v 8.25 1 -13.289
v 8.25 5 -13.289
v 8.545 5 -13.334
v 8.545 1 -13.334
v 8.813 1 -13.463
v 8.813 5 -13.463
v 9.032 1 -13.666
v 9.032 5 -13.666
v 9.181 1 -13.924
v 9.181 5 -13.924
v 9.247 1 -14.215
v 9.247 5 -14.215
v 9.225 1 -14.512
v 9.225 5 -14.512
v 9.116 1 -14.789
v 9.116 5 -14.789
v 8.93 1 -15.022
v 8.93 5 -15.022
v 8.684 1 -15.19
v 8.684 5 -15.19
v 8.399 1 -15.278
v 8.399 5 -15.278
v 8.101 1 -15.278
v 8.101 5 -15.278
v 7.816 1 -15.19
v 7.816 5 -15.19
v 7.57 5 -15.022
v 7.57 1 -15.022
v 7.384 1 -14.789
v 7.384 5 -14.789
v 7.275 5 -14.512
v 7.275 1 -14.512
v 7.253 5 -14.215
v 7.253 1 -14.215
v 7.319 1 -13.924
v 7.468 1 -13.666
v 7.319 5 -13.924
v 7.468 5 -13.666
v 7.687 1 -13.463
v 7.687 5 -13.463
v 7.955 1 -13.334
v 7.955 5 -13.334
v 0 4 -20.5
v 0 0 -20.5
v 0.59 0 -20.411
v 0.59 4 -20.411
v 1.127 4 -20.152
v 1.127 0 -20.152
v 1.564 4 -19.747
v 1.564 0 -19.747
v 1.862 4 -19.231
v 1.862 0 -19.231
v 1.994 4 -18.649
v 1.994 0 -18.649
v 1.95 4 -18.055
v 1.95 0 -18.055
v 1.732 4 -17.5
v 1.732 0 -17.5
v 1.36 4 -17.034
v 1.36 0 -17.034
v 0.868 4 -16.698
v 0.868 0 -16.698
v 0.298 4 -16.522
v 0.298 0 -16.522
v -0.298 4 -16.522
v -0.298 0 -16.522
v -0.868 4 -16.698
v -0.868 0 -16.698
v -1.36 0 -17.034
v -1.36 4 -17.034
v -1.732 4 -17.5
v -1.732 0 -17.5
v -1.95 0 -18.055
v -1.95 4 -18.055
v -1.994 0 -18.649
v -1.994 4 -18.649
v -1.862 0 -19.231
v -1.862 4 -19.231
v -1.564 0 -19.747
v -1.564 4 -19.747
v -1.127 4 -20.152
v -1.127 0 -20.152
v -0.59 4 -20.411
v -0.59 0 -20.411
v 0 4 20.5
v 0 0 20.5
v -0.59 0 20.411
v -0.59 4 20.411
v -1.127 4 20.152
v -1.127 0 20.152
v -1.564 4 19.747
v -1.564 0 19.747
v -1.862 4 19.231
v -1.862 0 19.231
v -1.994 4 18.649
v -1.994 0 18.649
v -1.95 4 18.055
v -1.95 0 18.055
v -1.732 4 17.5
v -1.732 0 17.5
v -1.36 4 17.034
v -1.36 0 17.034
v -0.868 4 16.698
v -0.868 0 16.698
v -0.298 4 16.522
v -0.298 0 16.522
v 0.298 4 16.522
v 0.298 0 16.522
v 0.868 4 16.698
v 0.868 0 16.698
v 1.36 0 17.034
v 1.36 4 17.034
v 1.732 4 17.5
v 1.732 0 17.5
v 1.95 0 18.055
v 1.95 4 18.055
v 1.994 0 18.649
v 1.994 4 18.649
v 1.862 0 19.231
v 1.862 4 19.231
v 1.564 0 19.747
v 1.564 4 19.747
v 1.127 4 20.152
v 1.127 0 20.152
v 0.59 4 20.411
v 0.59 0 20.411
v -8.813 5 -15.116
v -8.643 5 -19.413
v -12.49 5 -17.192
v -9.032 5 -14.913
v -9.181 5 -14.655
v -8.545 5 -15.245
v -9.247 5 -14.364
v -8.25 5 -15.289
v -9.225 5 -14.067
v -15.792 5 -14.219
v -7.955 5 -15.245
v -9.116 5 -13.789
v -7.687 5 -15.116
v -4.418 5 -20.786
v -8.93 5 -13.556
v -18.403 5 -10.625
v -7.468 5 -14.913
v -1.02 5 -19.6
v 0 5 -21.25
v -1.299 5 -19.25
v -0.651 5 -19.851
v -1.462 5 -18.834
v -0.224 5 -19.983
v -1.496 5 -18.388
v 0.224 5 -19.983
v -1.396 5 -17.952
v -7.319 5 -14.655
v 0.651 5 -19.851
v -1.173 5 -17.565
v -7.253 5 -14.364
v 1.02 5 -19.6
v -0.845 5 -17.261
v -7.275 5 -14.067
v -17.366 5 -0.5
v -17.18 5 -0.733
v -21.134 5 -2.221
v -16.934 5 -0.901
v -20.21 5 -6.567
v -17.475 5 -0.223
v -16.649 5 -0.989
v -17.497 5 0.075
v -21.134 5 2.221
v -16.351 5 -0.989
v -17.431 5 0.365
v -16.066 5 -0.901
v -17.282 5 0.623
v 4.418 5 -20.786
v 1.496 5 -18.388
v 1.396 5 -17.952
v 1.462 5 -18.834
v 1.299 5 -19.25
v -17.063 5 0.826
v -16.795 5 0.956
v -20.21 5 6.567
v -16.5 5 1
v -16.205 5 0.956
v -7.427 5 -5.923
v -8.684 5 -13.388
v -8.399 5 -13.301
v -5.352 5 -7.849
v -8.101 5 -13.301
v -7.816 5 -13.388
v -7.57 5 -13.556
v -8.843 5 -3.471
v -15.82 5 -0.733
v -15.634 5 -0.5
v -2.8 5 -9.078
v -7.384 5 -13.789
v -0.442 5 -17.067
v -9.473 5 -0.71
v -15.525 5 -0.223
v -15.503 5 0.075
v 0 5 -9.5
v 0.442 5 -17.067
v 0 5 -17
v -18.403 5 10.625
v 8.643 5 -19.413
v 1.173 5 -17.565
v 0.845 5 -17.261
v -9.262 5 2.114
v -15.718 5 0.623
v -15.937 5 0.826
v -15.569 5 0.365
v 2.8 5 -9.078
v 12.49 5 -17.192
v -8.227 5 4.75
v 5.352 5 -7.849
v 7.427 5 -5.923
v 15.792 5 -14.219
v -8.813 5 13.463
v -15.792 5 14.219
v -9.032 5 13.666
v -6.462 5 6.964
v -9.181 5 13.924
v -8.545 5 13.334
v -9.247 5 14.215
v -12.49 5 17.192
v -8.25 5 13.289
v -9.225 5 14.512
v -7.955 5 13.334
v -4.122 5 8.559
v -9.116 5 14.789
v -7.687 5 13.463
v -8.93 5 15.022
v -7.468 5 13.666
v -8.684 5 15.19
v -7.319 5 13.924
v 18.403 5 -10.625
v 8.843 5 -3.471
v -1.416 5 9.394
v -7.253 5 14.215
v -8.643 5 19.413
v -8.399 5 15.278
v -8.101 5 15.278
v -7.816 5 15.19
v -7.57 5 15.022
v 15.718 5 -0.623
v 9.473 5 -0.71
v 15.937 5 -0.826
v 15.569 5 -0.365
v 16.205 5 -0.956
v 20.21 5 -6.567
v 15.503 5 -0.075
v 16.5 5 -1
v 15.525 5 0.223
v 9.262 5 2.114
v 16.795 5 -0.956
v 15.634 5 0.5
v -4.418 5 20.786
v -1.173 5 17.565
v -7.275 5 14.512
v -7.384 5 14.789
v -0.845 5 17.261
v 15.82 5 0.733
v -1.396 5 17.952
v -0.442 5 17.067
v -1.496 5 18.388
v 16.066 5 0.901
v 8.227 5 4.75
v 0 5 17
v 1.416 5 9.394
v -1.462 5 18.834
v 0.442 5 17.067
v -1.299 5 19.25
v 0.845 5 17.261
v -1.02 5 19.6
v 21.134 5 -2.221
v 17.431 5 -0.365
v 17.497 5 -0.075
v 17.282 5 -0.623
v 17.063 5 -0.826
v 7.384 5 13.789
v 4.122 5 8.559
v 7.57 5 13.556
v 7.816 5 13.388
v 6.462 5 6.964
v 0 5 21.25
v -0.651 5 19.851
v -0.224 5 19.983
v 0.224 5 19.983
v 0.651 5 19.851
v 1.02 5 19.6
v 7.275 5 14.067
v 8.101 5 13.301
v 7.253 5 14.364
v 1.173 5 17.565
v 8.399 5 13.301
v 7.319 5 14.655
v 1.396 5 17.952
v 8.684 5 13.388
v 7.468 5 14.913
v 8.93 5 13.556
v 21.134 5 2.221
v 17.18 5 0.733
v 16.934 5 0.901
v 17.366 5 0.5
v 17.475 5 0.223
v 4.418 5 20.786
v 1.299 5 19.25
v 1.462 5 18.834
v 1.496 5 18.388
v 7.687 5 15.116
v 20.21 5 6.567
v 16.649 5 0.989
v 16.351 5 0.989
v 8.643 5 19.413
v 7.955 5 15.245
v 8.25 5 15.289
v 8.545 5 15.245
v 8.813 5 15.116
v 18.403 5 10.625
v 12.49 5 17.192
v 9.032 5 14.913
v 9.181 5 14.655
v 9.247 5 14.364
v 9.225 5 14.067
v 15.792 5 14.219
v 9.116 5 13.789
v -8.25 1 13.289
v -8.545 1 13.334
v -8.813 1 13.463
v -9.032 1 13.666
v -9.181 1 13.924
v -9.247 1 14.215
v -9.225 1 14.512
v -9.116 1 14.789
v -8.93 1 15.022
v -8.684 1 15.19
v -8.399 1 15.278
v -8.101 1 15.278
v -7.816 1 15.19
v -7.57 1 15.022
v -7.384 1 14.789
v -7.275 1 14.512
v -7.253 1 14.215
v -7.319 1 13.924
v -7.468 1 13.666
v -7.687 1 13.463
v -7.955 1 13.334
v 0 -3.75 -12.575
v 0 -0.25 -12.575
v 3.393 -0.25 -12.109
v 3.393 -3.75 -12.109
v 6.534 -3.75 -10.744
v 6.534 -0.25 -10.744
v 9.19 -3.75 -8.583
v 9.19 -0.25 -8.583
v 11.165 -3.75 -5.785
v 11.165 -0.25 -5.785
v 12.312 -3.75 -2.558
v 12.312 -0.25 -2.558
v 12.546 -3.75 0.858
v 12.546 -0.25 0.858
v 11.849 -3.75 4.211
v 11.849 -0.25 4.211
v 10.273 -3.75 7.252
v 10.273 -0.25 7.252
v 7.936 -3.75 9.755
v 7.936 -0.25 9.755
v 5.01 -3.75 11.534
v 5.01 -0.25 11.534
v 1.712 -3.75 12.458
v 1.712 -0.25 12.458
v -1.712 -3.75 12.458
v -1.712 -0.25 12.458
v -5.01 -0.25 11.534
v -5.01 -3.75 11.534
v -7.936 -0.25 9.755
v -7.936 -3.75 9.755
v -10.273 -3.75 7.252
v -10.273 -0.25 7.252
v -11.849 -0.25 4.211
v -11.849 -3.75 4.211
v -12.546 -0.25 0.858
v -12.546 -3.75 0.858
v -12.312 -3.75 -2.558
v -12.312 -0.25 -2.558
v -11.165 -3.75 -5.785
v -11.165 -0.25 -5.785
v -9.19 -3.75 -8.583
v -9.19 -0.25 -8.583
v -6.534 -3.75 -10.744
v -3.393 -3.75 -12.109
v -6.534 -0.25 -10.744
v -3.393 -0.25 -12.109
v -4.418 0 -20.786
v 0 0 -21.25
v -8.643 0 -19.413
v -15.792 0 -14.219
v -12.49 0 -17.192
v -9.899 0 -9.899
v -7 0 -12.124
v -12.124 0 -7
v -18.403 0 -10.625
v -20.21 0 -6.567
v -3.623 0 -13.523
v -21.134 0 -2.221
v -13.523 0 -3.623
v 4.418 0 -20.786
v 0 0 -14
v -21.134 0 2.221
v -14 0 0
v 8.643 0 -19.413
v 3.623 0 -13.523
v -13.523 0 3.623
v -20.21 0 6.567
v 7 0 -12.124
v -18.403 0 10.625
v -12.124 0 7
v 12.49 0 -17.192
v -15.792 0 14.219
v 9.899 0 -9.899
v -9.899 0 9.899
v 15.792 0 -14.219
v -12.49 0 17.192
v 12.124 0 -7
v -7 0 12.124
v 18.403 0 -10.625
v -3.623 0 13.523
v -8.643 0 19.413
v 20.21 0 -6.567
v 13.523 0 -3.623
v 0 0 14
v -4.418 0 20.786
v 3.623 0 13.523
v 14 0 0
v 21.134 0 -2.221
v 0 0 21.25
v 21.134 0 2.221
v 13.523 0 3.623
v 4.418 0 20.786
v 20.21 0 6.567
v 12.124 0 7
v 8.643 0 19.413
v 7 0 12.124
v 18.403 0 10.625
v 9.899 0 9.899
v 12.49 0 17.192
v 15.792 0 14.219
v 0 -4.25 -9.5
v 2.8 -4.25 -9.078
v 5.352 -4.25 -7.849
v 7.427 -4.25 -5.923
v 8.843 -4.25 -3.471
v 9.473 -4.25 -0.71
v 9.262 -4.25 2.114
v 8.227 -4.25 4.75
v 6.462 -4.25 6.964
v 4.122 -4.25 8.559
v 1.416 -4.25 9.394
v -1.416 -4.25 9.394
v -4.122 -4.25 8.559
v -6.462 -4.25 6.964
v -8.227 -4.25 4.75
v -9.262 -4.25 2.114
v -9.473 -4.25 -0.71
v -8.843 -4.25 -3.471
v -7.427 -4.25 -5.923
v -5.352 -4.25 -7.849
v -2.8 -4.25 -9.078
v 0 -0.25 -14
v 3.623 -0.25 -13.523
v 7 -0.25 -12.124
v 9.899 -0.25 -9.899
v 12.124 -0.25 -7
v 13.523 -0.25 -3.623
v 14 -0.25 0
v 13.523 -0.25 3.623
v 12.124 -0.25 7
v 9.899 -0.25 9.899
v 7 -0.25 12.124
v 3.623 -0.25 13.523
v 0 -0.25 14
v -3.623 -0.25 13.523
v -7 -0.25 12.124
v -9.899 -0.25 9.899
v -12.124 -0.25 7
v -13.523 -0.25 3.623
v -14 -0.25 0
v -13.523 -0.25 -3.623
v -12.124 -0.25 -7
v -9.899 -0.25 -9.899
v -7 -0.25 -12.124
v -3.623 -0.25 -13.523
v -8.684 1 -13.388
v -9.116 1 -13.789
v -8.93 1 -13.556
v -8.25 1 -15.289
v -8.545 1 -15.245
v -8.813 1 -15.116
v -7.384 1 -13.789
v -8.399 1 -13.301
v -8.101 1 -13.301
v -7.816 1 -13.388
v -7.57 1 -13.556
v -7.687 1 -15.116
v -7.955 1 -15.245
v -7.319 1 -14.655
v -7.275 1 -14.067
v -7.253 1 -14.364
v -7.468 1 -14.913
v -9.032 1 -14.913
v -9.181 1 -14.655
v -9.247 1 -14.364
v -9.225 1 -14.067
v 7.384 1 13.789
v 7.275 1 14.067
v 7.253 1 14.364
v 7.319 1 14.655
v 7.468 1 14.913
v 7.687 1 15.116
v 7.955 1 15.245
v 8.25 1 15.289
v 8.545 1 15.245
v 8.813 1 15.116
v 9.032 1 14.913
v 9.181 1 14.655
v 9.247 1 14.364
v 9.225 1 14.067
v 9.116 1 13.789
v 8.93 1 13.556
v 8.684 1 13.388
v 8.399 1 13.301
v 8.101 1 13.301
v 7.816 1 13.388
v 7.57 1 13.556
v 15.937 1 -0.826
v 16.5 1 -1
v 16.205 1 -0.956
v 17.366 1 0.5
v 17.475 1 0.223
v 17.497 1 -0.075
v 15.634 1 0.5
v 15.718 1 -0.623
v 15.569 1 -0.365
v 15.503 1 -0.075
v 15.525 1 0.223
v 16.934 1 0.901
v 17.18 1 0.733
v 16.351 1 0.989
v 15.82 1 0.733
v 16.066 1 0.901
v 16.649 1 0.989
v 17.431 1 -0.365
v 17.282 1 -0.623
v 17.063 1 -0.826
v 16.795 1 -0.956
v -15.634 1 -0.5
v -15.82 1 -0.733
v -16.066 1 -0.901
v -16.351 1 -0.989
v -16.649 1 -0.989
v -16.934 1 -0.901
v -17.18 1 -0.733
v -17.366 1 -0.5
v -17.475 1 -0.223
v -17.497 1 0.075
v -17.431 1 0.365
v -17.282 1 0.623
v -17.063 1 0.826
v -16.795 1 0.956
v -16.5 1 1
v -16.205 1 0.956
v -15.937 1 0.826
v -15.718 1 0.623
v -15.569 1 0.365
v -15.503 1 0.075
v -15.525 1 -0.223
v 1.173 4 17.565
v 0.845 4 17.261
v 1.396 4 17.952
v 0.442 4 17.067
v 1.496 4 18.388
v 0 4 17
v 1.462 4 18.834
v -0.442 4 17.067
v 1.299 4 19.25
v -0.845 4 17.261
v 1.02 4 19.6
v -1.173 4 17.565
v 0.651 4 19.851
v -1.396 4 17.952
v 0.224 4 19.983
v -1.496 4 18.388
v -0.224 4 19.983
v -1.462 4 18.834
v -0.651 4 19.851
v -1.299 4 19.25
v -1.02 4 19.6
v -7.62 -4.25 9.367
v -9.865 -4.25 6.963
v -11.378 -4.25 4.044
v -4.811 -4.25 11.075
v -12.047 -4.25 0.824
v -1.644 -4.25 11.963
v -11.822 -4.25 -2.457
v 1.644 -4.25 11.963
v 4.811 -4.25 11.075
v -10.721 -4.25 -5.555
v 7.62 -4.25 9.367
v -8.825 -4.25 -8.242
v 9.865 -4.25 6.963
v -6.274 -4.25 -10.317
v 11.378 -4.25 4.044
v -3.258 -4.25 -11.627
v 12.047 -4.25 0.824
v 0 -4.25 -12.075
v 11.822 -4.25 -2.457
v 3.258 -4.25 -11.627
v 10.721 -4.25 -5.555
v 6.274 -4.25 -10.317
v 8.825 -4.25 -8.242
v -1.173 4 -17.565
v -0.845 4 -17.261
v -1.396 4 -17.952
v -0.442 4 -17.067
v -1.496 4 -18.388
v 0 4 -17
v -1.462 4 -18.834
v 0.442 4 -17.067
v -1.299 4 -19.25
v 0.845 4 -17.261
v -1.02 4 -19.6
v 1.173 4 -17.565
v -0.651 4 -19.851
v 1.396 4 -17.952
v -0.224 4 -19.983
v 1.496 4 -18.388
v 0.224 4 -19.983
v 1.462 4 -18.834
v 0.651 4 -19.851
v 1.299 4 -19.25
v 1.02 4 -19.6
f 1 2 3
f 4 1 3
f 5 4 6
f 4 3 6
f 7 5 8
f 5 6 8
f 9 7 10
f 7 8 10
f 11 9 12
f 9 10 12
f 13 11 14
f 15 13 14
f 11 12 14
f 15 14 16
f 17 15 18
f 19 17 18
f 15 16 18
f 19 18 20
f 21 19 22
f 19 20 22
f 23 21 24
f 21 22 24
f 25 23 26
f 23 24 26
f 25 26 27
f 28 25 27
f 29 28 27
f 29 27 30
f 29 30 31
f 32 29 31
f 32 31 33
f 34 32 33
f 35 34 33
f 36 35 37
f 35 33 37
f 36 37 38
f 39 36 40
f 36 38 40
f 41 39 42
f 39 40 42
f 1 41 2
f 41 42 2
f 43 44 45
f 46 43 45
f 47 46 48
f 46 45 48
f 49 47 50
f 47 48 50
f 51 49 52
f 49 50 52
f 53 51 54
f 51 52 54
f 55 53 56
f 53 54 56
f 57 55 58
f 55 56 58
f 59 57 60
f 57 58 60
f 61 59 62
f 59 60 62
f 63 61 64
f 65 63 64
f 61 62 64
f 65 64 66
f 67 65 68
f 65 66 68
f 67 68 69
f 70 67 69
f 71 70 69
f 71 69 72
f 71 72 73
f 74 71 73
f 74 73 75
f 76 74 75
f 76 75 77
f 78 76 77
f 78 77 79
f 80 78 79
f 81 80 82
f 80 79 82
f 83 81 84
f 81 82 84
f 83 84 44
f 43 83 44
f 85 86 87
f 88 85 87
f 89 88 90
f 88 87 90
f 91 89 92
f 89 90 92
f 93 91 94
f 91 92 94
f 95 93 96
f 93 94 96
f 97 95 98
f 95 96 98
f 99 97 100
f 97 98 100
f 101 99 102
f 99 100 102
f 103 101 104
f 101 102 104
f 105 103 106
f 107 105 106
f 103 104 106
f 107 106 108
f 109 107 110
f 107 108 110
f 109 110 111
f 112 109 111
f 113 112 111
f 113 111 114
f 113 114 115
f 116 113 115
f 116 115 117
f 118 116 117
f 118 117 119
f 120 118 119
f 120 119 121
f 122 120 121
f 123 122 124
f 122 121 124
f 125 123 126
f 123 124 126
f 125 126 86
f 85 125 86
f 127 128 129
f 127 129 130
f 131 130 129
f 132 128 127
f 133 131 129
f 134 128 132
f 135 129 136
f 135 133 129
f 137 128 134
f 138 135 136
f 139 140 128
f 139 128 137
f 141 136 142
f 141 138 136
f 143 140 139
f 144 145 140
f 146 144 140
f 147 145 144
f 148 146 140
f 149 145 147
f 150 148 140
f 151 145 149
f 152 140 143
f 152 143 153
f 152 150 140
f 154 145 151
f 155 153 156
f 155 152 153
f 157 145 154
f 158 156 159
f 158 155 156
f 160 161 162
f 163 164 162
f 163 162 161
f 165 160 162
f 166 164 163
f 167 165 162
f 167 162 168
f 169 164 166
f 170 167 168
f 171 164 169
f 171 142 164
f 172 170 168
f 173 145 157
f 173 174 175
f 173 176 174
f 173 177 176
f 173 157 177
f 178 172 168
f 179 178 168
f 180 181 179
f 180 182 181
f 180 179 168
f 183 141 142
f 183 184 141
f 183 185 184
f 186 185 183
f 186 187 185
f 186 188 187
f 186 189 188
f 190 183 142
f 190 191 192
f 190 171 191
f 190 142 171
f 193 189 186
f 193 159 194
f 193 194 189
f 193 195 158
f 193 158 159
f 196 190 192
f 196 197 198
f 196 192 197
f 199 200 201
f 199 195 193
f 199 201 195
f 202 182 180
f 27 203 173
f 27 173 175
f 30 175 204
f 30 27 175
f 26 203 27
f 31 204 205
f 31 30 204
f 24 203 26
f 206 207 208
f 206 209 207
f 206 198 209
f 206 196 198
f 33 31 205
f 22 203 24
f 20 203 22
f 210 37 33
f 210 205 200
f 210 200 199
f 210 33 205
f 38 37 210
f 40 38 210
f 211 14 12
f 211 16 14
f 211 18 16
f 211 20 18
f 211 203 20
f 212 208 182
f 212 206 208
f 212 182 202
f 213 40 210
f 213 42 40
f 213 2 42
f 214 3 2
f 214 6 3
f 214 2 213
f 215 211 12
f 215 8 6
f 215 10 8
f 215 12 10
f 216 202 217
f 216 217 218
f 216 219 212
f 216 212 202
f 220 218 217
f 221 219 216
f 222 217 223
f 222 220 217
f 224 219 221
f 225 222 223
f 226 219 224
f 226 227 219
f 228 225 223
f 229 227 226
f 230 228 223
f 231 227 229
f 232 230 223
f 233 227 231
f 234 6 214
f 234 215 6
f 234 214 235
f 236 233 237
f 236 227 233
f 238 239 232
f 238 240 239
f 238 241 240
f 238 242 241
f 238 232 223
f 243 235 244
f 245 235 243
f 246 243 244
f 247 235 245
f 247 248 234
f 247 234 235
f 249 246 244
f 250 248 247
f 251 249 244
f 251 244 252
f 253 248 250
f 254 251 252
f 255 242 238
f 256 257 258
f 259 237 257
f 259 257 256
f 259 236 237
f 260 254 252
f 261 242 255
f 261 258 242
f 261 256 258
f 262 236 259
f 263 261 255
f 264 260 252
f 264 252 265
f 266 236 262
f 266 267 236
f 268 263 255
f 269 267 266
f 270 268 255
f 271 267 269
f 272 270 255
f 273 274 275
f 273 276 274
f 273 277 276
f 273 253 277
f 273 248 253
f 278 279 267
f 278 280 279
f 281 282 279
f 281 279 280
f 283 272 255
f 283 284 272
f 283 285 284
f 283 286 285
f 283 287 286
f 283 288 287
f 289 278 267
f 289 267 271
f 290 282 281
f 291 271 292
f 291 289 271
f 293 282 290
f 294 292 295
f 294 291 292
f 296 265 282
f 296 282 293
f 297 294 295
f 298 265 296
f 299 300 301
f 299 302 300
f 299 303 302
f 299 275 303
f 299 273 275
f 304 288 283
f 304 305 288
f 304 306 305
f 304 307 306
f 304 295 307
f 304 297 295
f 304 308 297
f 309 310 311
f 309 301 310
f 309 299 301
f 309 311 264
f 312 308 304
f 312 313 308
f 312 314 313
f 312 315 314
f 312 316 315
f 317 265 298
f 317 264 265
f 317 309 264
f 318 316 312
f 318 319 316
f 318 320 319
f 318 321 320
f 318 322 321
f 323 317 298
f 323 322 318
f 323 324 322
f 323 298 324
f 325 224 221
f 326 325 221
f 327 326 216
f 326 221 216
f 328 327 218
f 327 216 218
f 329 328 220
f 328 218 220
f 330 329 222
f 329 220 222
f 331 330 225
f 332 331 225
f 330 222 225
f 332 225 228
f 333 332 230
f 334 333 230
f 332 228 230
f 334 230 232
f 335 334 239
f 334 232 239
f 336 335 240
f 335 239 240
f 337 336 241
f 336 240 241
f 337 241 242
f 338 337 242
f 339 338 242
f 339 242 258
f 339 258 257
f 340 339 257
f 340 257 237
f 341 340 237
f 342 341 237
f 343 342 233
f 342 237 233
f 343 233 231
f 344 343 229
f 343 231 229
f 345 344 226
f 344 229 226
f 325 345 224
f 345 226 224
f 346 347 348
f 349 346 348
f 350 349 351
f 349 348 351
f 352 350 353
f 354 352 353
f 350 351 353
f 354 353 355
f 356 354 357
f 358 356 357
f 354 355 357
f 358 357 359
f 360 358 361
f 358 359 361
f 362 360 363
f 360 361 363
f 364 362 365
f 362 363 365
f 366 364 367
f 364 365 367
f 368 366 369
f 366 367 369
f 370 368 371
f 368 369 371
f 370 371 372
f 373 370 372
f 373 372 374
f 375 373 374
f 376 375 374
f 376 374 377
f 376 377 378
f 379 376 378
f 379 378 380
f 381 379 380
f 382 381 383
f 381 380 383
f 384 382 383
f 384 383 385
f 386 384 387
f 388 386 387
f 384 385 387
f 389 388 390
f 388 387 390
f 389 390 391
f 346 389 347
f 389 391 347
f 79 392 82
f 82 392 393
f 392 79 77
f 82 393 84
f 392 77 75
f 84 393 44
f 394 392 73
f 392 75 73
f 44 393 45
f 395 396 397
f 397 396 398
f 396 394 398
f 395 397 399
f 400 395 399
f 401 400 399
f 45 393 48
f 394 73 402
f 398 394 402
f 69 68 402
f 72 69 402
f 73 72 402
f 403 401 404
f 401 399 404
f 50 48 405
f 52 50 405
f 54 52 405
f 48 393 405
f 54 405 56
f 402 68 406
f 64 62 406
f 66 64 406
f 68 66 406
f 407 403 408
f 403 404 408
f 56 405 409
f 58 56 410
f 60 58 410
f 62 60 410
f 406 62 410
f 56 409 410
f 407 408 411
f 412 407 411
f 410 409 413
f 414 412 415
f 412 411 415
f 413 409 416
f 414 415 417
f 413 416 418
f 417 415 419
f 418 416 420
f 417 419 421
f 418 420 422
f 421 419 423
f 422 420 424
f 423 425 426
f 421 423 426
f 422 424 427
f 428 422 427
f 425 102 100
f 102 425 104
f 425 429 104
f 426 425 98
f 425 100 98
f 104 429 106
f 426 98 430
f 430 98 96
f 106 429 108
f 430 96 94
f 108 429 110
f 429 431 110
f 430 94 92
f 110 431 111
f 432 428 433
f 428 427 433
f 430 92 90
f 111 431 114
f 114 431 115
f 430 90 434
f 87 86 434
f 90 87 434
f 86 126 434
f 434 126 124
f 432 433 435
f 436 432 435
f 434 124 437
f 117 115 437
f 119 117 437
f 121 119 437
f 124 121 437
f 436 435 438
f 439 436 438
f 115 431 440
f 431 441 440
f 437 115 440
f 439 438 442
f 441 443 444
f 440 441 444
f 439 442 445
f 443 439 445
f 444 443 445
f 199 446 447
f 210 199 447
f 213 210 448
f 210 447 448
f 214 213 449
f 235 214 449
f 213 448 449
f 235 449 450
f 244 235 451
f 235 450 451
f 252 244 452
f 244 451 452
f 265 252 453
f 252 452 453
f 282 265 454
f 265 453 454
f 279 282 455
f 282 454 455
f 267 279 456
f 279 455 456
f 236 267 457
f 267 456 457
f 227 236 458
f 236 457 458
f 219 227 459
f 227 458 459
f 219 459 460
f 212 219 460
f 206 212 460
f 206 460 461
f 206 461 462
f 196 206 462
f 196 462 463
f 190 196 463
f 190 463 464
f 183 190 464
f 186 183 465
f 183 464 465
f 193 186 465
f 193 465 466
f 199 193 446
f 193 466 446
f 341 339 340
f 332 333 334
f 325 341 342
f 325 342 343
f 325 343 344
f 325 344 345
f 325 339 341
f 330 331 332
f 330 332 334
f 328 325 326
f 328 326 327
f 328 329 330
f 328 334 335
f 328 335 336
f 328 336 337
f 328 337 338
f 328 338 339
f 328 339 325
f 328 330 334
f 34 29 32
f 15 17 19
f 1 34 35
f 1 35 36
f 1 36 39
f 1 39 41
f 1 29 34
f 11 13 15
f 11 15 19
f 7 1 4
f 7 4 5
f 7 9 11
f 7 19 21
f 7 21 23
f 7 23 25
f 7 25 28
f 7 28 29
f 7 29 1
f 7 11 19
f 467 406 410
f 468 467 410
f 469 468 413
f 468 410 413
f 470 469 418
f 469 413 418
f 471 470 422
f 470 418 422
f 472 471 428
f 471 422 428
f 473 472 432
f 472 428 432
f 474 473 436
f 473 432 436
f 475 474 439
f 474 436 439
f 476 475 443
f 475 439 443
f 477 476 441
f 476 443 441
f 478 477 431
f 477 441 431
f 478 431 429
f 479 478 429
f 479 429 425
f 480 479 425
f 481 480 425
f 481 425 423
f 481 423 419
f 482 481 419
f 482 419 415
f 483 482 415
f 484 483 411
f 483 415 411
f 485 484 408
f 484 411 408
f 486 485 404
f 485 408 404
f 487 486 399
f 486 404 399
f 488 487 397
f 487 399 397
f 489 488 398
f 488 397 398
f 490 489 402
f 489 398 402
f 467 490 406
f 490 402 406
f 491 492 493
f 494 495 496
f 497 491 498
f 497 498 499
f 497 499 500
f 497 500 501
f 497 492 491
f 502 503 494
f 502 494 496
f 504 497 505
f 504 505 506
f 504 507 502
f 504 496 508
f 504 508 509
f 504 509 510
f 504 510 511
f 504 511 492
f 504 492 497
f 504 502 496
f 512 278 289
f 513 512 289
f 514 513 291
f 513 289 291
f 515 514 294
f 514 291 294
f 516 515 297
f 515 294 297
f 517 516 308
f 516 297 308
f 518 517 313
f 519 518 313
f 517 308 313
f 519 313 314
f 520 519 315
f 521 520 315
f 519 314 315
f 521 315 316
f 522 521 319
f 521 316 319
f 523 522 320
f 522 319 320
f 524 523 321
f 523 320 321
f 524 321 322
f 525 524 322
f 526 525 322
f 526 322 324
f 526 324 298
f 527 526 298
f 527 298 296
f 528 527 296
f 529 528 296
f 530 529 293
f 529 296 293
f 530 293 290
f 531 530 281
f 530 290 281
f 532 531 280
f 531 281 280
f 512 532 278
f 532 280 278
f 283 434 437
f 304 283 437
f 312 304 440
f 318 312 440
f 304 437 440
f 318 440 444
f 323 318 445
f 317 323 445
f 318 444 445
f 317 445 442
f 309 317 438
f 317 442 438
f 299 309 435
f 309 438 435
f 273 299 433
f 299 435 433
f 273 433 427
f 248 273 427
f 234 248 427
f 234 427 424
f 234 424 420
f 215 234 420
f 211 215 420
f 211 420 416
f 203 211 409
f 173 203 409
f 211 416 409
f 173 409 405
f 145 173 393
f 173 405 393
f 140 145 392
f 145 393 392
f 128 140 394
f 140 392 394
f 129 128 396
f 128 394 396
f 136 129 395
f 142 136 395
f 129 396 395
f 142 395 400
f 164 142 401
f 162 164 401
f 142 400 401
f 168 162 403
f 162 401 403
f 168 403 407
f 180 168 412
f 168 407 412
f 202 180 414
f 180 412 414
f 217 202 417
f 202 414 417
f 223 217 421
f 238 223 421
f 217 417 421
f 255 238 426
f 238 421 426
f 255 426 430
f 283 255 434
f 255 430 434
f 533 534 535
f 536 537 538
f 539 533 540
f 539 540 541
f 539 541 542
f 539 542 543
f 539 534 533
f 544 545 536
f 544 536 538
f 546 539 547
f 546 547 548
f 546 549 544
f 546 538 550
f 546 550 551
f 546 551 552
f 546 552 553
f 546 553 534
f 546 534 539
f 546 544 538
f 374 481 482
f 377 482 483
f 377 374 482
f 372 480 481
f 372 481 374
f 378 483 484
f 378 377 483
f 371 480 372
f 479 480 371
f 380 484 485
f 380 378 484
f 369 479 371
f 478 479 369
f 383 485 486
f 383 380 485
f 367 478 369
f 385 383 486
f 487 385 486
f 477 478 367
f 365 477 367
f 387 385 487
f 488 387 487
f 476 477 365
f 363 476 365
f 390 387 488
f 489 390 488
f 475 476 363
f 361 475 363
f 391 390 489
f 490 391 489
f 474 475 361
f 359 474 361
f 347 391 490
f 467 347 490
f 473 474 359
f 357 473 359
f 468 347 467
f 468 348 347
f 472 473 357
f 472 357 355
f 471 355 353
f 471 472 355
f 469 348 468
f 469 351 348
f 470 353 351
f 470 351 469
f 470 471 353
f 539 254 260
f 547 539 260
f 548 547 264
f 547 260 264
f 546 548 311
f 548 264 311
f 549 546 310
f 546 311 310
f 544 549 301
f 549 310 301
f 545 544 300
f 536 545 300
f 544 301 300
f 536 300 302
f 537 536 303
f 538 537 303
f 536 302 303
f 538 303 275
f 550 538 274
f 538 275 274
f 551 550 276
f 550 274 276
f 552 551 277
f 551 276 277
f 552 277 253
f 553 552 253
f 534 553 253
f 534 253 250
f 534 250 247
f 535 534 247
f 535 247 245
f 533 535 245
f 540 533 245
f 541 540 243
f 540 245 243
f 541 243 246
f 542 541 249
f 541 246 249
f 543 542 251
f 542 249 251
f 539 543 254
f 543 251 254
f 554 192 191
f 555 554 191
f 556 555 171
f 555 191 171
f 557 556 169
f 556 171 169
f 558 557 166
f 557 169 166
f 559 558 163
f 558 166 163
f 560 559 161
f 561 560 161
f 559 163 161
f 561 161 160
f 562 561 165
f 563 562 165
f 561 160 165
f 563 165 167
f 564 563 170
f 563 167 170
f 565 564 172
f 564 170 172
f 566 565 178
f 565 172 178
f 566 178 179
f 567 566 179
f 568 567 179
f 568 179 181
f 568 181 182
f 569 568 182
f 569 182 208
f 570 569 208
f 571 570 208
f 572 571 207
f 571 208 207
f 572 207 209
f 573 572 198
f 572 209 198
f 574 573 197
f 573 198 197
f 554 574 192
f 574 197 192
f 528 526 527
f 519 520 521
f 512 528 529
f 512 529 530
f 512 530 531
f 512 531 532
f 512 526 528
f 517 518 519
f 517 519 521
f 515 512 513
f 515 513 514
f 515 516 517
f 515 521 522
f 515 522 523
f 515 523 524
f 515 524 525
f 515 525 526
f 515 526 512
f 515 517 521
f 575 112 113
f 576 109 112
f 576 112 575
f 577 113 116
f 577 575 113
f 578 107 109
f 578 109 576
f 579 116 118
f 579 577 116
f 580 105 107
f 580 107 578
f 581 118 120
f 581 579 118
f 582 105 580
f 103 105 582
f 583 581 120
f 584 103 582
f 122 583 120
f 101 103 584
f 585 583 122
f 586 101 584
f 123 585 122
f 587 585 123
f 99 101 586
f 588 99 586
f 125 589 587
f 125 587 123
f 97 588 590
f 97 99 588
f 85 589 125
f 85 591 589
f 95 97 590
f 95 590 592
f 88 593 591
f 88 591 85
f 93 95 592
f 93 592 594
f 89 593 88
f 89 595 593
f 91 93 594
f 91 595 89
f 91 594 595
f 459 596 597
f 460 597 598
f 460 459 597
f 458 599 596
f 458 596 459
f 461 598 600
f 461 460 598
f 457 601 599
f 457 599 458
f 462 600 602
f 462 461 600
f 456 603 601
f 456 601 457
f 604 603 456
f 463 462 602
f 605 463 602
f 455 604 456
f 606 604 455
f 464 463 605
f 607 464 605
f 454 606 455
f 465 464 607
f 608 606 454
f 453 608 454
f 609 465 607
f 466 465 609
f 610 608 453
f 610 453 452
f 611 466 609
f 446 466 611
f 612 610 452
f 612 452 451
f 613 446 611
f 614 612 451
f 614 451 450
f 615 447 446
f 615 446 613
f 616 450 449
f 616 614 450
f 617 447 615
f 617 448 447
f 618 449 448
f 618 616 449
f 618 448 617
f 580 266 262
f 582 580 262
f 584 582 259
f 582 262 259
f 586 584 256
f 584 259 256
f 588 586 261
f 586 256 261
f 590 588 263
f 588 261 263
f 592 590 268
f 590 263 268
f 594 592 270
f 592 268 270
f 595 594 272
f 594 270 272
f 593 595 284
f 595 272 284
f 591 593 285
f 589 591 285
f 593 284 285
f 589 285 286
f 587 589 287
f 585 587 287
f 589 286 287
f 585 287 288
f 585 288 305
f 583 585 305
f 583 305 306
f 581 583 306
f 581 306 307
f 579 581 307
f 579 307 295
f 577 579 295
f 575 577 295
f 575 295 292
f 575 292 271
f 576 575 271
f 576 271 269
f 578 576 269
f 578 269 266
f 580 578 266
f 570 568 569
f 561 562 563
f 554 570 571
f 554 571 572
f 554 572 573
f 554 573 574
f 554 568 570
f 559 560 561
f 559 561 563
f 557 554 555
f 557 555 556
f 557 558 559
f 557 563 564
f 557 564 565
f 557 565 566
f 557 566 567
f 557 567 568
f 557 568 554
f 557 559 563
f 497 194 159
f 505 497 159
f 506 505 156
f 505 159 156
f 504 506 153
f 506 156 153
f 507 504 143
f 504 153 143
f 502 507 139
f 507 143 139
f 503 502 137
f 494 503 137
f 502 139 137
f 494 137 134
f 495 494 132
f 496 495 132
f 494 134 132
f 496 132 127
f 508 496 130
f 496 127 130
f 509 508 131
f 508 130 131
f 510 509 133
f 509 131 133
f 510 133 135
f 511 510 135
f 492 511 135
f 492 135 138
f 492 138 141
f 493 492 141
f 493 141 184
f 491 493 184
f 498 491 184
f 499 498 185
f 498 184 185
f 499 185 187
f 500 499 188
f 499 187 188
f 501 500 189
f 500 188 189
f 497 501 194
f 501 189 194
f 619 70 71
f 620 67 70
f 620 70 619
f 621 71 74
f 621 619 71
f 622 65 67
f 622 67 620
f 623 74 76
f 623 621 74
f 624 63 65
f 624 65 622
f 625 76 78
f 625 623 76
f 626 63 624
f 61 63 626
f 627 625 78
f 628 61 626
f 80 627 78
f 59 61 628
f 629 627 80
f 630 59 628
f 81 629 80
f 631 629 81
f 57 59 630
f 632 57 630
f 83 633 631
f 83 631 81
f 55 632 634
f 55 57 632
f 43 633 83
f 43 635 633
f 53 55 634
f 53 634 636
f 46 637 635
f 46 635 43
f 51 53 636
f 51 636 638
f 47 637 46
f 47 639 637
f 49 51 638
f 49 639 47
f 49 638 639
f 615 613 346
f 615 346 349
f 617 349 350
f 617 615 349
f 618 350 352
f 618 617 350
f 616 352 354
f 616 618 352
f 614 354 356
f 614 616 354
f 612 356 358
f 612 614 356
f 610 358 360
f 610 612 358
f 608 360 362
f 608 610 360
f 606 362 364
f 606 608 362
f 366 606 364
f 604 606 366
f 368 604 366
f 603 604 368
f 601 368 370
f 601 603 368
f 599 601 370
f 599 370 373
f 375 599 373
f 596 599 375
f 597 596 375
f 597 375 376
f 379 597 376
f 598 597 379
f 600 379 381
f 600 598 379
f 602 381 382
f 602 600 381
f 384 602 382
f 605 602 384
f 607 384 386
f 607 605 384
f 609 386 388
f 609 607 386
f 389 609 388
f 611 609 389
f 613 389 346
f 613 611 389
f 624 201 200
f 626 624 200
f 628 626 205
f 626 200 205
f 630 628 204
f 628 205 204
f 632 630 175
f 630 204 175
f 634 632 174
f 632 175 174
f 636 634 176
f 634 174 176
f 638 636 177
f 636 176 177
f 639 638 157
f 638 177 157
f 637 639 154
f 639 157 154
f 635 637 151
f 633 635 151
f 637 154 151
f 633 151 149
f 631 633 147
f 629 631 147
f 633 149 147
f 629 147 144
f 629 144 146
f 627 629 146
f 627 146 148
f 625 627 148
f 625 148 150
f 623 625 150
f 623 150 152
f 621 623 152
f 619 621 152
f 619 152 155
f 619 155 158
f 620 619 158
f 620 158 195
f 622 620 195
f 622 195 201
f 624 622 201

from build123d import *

# Parameters (mm, degrees)
SKETCH1_R           = 21.25
BOSS_EXTRUDE1_DEPTH = 5
SKETCH2_R           = 1.5
CUT_EXTRUDE1_DEPTH  = 5
SKETCH3_R           = 2
CUT_EXTRUDE2_DEPTH  = 4
CIRPATTERN1_COUNT   = 2
SKETCH5_R           = 14
BOSS_EXTRUDE2_DEPTH = 0.25
SKETCH6_R           = 12.575
BOSS_EXTRUDE3_DEPTH = 4
CHAMFER1_SIZE       = 0.5
SKETCH7_R           = 9.5
CUT_EXTRUDE3_DEPTH  = 9.25
SKETCH8_R           = 1
CUT_EXTRUDE4_DEPTH  = 4
CIRPATTERN2_COUNT   = 6


with BuildPart() as part:
    # Sketch1 → Boss-Extrude1 (new body)
    with BuildSketch(Plane(origin=(0, 0, 0), x_dir=(1, 0, 0), z_dir=(0, 1, 0))):
        with Locations(Location((0, 0, 0), (0, 0, 270))):
            Circle(SKETCH1_R)
    extrude(amount=BOSS_EXTRUDE1_DEPTH)

    # Sketch2 → Cut-Extrude1 (cut)
    with BuildSketch(Plane(origin=(0, 5, 0), x_dir=(1, 0, 0), z_dir=(0, 1, 0))):
        with Locations(Location((0, 18.5, 0), (0, 0, 270))):
            Circle(SKETCH2_R)
    cut_extrude1 = extrude(amount=-CUT_EXTRUDE1_DEPTH, mode=Mode.SUBTRACT)

    # Sketch3 → Cut-Extrude2 (cut)
    with BuildSketch(Plane.XZ):
        with Locations(Location((0, -18.5, 0), (0, 0, 270))):
            Circle(SKETCH3_R)
    cut_extrude2 = extrude(amount=-CUT_EXTRUDE2_DEPTH, mode=Mode.SUBTRACT)

    # CirPattern1: Cut-Extrude1, Cut-Extrude2 ×2 about axis
    cirpattern1_axis = Axis((0, 0, 0), (0, 1, 0))
    add([cut_extrude1.rotate(cirpattern1_axis, i * 360 / CIRPATTERN1_COUNT) for i in range(1, CIRPATTERN1_COUNT)], mode=Mode.SUBTRACT)
    add([cut_extrude2.rotate(cirpattern1_axis, i * 360 / CIRPATTERN1_COUNT) for i in range(1, CIRPATTERN1_COUNT)], mode=Mode.SUBTRACT)

    # Sketch5 → Boss-Extrude2 (add)
    with BuildSketch(Plane.XZ):
        with Locations(Location((0, 0, 0), (0, 0, 270))):
            Circle(SKETCH5_R)
    extrude(amount=BOSS_EXTRUDE2_DEPTH)

    # Sketch6 → Boss-Extrude3 (add)
    with BuildSketch(Plane.XZ.offset(0.25)):
        with Locations(Location((0, 0, 0), (0, 0, 270))):
            Circle(SKETCH6_R)
    extrude(amount=BOSS_EXTRUDE3_DEPTH)

    # Chamfer1
    chamfer1_edges = [part.edges().sort_by_distance(p)[0] for p in [
        (0, -4.25, 12.575),
    ]]
    chamfer(chamfer1_edges, length=CHAMFER1_SIZE)

    # Sketch7 → Cut-Extrude3 (cut)
    with BuildSketch(Plane.XZ.offset(4.25)):
        with Locations(Location((0, 0, 0), (0, 0, 270))):
            Circle(SKETCH7_R)
    extrude(amount=-CUT_EXTRUDE3_DEPTH, mode=Mode.SUBTRACT)

    # Sketch8 → Cut-Extrude4 (cut)
    with BuildSketch(Plane(origin=(0, 5, 0), x_dir=(1, 0, 0), z_dir=(0, 1, 0))):
        with Locations(Location((8.25, 14.289419162, 0), (0, 0, 270))):
            Circle(SKETCH8_R)
    cut_extrude4 = extrude(amount=-CUT_EXTRUDE4_DEPTH, mode=Mode.SUBTRACT)

    # CirPattern2: Cut-Extrude4 ×6 about axis
    cirpattern2_axis = Axis((0, 0, 0), (0, 1, 0))
    for i in range(1, CIRPATTERN2_COUNT):
        add(cut_extrude4.rotate(cirpattern2_axis, i * 360 / CIRPATTERN2_COUNT), mode=Mode.SUBTRACT)


solid = part.part
